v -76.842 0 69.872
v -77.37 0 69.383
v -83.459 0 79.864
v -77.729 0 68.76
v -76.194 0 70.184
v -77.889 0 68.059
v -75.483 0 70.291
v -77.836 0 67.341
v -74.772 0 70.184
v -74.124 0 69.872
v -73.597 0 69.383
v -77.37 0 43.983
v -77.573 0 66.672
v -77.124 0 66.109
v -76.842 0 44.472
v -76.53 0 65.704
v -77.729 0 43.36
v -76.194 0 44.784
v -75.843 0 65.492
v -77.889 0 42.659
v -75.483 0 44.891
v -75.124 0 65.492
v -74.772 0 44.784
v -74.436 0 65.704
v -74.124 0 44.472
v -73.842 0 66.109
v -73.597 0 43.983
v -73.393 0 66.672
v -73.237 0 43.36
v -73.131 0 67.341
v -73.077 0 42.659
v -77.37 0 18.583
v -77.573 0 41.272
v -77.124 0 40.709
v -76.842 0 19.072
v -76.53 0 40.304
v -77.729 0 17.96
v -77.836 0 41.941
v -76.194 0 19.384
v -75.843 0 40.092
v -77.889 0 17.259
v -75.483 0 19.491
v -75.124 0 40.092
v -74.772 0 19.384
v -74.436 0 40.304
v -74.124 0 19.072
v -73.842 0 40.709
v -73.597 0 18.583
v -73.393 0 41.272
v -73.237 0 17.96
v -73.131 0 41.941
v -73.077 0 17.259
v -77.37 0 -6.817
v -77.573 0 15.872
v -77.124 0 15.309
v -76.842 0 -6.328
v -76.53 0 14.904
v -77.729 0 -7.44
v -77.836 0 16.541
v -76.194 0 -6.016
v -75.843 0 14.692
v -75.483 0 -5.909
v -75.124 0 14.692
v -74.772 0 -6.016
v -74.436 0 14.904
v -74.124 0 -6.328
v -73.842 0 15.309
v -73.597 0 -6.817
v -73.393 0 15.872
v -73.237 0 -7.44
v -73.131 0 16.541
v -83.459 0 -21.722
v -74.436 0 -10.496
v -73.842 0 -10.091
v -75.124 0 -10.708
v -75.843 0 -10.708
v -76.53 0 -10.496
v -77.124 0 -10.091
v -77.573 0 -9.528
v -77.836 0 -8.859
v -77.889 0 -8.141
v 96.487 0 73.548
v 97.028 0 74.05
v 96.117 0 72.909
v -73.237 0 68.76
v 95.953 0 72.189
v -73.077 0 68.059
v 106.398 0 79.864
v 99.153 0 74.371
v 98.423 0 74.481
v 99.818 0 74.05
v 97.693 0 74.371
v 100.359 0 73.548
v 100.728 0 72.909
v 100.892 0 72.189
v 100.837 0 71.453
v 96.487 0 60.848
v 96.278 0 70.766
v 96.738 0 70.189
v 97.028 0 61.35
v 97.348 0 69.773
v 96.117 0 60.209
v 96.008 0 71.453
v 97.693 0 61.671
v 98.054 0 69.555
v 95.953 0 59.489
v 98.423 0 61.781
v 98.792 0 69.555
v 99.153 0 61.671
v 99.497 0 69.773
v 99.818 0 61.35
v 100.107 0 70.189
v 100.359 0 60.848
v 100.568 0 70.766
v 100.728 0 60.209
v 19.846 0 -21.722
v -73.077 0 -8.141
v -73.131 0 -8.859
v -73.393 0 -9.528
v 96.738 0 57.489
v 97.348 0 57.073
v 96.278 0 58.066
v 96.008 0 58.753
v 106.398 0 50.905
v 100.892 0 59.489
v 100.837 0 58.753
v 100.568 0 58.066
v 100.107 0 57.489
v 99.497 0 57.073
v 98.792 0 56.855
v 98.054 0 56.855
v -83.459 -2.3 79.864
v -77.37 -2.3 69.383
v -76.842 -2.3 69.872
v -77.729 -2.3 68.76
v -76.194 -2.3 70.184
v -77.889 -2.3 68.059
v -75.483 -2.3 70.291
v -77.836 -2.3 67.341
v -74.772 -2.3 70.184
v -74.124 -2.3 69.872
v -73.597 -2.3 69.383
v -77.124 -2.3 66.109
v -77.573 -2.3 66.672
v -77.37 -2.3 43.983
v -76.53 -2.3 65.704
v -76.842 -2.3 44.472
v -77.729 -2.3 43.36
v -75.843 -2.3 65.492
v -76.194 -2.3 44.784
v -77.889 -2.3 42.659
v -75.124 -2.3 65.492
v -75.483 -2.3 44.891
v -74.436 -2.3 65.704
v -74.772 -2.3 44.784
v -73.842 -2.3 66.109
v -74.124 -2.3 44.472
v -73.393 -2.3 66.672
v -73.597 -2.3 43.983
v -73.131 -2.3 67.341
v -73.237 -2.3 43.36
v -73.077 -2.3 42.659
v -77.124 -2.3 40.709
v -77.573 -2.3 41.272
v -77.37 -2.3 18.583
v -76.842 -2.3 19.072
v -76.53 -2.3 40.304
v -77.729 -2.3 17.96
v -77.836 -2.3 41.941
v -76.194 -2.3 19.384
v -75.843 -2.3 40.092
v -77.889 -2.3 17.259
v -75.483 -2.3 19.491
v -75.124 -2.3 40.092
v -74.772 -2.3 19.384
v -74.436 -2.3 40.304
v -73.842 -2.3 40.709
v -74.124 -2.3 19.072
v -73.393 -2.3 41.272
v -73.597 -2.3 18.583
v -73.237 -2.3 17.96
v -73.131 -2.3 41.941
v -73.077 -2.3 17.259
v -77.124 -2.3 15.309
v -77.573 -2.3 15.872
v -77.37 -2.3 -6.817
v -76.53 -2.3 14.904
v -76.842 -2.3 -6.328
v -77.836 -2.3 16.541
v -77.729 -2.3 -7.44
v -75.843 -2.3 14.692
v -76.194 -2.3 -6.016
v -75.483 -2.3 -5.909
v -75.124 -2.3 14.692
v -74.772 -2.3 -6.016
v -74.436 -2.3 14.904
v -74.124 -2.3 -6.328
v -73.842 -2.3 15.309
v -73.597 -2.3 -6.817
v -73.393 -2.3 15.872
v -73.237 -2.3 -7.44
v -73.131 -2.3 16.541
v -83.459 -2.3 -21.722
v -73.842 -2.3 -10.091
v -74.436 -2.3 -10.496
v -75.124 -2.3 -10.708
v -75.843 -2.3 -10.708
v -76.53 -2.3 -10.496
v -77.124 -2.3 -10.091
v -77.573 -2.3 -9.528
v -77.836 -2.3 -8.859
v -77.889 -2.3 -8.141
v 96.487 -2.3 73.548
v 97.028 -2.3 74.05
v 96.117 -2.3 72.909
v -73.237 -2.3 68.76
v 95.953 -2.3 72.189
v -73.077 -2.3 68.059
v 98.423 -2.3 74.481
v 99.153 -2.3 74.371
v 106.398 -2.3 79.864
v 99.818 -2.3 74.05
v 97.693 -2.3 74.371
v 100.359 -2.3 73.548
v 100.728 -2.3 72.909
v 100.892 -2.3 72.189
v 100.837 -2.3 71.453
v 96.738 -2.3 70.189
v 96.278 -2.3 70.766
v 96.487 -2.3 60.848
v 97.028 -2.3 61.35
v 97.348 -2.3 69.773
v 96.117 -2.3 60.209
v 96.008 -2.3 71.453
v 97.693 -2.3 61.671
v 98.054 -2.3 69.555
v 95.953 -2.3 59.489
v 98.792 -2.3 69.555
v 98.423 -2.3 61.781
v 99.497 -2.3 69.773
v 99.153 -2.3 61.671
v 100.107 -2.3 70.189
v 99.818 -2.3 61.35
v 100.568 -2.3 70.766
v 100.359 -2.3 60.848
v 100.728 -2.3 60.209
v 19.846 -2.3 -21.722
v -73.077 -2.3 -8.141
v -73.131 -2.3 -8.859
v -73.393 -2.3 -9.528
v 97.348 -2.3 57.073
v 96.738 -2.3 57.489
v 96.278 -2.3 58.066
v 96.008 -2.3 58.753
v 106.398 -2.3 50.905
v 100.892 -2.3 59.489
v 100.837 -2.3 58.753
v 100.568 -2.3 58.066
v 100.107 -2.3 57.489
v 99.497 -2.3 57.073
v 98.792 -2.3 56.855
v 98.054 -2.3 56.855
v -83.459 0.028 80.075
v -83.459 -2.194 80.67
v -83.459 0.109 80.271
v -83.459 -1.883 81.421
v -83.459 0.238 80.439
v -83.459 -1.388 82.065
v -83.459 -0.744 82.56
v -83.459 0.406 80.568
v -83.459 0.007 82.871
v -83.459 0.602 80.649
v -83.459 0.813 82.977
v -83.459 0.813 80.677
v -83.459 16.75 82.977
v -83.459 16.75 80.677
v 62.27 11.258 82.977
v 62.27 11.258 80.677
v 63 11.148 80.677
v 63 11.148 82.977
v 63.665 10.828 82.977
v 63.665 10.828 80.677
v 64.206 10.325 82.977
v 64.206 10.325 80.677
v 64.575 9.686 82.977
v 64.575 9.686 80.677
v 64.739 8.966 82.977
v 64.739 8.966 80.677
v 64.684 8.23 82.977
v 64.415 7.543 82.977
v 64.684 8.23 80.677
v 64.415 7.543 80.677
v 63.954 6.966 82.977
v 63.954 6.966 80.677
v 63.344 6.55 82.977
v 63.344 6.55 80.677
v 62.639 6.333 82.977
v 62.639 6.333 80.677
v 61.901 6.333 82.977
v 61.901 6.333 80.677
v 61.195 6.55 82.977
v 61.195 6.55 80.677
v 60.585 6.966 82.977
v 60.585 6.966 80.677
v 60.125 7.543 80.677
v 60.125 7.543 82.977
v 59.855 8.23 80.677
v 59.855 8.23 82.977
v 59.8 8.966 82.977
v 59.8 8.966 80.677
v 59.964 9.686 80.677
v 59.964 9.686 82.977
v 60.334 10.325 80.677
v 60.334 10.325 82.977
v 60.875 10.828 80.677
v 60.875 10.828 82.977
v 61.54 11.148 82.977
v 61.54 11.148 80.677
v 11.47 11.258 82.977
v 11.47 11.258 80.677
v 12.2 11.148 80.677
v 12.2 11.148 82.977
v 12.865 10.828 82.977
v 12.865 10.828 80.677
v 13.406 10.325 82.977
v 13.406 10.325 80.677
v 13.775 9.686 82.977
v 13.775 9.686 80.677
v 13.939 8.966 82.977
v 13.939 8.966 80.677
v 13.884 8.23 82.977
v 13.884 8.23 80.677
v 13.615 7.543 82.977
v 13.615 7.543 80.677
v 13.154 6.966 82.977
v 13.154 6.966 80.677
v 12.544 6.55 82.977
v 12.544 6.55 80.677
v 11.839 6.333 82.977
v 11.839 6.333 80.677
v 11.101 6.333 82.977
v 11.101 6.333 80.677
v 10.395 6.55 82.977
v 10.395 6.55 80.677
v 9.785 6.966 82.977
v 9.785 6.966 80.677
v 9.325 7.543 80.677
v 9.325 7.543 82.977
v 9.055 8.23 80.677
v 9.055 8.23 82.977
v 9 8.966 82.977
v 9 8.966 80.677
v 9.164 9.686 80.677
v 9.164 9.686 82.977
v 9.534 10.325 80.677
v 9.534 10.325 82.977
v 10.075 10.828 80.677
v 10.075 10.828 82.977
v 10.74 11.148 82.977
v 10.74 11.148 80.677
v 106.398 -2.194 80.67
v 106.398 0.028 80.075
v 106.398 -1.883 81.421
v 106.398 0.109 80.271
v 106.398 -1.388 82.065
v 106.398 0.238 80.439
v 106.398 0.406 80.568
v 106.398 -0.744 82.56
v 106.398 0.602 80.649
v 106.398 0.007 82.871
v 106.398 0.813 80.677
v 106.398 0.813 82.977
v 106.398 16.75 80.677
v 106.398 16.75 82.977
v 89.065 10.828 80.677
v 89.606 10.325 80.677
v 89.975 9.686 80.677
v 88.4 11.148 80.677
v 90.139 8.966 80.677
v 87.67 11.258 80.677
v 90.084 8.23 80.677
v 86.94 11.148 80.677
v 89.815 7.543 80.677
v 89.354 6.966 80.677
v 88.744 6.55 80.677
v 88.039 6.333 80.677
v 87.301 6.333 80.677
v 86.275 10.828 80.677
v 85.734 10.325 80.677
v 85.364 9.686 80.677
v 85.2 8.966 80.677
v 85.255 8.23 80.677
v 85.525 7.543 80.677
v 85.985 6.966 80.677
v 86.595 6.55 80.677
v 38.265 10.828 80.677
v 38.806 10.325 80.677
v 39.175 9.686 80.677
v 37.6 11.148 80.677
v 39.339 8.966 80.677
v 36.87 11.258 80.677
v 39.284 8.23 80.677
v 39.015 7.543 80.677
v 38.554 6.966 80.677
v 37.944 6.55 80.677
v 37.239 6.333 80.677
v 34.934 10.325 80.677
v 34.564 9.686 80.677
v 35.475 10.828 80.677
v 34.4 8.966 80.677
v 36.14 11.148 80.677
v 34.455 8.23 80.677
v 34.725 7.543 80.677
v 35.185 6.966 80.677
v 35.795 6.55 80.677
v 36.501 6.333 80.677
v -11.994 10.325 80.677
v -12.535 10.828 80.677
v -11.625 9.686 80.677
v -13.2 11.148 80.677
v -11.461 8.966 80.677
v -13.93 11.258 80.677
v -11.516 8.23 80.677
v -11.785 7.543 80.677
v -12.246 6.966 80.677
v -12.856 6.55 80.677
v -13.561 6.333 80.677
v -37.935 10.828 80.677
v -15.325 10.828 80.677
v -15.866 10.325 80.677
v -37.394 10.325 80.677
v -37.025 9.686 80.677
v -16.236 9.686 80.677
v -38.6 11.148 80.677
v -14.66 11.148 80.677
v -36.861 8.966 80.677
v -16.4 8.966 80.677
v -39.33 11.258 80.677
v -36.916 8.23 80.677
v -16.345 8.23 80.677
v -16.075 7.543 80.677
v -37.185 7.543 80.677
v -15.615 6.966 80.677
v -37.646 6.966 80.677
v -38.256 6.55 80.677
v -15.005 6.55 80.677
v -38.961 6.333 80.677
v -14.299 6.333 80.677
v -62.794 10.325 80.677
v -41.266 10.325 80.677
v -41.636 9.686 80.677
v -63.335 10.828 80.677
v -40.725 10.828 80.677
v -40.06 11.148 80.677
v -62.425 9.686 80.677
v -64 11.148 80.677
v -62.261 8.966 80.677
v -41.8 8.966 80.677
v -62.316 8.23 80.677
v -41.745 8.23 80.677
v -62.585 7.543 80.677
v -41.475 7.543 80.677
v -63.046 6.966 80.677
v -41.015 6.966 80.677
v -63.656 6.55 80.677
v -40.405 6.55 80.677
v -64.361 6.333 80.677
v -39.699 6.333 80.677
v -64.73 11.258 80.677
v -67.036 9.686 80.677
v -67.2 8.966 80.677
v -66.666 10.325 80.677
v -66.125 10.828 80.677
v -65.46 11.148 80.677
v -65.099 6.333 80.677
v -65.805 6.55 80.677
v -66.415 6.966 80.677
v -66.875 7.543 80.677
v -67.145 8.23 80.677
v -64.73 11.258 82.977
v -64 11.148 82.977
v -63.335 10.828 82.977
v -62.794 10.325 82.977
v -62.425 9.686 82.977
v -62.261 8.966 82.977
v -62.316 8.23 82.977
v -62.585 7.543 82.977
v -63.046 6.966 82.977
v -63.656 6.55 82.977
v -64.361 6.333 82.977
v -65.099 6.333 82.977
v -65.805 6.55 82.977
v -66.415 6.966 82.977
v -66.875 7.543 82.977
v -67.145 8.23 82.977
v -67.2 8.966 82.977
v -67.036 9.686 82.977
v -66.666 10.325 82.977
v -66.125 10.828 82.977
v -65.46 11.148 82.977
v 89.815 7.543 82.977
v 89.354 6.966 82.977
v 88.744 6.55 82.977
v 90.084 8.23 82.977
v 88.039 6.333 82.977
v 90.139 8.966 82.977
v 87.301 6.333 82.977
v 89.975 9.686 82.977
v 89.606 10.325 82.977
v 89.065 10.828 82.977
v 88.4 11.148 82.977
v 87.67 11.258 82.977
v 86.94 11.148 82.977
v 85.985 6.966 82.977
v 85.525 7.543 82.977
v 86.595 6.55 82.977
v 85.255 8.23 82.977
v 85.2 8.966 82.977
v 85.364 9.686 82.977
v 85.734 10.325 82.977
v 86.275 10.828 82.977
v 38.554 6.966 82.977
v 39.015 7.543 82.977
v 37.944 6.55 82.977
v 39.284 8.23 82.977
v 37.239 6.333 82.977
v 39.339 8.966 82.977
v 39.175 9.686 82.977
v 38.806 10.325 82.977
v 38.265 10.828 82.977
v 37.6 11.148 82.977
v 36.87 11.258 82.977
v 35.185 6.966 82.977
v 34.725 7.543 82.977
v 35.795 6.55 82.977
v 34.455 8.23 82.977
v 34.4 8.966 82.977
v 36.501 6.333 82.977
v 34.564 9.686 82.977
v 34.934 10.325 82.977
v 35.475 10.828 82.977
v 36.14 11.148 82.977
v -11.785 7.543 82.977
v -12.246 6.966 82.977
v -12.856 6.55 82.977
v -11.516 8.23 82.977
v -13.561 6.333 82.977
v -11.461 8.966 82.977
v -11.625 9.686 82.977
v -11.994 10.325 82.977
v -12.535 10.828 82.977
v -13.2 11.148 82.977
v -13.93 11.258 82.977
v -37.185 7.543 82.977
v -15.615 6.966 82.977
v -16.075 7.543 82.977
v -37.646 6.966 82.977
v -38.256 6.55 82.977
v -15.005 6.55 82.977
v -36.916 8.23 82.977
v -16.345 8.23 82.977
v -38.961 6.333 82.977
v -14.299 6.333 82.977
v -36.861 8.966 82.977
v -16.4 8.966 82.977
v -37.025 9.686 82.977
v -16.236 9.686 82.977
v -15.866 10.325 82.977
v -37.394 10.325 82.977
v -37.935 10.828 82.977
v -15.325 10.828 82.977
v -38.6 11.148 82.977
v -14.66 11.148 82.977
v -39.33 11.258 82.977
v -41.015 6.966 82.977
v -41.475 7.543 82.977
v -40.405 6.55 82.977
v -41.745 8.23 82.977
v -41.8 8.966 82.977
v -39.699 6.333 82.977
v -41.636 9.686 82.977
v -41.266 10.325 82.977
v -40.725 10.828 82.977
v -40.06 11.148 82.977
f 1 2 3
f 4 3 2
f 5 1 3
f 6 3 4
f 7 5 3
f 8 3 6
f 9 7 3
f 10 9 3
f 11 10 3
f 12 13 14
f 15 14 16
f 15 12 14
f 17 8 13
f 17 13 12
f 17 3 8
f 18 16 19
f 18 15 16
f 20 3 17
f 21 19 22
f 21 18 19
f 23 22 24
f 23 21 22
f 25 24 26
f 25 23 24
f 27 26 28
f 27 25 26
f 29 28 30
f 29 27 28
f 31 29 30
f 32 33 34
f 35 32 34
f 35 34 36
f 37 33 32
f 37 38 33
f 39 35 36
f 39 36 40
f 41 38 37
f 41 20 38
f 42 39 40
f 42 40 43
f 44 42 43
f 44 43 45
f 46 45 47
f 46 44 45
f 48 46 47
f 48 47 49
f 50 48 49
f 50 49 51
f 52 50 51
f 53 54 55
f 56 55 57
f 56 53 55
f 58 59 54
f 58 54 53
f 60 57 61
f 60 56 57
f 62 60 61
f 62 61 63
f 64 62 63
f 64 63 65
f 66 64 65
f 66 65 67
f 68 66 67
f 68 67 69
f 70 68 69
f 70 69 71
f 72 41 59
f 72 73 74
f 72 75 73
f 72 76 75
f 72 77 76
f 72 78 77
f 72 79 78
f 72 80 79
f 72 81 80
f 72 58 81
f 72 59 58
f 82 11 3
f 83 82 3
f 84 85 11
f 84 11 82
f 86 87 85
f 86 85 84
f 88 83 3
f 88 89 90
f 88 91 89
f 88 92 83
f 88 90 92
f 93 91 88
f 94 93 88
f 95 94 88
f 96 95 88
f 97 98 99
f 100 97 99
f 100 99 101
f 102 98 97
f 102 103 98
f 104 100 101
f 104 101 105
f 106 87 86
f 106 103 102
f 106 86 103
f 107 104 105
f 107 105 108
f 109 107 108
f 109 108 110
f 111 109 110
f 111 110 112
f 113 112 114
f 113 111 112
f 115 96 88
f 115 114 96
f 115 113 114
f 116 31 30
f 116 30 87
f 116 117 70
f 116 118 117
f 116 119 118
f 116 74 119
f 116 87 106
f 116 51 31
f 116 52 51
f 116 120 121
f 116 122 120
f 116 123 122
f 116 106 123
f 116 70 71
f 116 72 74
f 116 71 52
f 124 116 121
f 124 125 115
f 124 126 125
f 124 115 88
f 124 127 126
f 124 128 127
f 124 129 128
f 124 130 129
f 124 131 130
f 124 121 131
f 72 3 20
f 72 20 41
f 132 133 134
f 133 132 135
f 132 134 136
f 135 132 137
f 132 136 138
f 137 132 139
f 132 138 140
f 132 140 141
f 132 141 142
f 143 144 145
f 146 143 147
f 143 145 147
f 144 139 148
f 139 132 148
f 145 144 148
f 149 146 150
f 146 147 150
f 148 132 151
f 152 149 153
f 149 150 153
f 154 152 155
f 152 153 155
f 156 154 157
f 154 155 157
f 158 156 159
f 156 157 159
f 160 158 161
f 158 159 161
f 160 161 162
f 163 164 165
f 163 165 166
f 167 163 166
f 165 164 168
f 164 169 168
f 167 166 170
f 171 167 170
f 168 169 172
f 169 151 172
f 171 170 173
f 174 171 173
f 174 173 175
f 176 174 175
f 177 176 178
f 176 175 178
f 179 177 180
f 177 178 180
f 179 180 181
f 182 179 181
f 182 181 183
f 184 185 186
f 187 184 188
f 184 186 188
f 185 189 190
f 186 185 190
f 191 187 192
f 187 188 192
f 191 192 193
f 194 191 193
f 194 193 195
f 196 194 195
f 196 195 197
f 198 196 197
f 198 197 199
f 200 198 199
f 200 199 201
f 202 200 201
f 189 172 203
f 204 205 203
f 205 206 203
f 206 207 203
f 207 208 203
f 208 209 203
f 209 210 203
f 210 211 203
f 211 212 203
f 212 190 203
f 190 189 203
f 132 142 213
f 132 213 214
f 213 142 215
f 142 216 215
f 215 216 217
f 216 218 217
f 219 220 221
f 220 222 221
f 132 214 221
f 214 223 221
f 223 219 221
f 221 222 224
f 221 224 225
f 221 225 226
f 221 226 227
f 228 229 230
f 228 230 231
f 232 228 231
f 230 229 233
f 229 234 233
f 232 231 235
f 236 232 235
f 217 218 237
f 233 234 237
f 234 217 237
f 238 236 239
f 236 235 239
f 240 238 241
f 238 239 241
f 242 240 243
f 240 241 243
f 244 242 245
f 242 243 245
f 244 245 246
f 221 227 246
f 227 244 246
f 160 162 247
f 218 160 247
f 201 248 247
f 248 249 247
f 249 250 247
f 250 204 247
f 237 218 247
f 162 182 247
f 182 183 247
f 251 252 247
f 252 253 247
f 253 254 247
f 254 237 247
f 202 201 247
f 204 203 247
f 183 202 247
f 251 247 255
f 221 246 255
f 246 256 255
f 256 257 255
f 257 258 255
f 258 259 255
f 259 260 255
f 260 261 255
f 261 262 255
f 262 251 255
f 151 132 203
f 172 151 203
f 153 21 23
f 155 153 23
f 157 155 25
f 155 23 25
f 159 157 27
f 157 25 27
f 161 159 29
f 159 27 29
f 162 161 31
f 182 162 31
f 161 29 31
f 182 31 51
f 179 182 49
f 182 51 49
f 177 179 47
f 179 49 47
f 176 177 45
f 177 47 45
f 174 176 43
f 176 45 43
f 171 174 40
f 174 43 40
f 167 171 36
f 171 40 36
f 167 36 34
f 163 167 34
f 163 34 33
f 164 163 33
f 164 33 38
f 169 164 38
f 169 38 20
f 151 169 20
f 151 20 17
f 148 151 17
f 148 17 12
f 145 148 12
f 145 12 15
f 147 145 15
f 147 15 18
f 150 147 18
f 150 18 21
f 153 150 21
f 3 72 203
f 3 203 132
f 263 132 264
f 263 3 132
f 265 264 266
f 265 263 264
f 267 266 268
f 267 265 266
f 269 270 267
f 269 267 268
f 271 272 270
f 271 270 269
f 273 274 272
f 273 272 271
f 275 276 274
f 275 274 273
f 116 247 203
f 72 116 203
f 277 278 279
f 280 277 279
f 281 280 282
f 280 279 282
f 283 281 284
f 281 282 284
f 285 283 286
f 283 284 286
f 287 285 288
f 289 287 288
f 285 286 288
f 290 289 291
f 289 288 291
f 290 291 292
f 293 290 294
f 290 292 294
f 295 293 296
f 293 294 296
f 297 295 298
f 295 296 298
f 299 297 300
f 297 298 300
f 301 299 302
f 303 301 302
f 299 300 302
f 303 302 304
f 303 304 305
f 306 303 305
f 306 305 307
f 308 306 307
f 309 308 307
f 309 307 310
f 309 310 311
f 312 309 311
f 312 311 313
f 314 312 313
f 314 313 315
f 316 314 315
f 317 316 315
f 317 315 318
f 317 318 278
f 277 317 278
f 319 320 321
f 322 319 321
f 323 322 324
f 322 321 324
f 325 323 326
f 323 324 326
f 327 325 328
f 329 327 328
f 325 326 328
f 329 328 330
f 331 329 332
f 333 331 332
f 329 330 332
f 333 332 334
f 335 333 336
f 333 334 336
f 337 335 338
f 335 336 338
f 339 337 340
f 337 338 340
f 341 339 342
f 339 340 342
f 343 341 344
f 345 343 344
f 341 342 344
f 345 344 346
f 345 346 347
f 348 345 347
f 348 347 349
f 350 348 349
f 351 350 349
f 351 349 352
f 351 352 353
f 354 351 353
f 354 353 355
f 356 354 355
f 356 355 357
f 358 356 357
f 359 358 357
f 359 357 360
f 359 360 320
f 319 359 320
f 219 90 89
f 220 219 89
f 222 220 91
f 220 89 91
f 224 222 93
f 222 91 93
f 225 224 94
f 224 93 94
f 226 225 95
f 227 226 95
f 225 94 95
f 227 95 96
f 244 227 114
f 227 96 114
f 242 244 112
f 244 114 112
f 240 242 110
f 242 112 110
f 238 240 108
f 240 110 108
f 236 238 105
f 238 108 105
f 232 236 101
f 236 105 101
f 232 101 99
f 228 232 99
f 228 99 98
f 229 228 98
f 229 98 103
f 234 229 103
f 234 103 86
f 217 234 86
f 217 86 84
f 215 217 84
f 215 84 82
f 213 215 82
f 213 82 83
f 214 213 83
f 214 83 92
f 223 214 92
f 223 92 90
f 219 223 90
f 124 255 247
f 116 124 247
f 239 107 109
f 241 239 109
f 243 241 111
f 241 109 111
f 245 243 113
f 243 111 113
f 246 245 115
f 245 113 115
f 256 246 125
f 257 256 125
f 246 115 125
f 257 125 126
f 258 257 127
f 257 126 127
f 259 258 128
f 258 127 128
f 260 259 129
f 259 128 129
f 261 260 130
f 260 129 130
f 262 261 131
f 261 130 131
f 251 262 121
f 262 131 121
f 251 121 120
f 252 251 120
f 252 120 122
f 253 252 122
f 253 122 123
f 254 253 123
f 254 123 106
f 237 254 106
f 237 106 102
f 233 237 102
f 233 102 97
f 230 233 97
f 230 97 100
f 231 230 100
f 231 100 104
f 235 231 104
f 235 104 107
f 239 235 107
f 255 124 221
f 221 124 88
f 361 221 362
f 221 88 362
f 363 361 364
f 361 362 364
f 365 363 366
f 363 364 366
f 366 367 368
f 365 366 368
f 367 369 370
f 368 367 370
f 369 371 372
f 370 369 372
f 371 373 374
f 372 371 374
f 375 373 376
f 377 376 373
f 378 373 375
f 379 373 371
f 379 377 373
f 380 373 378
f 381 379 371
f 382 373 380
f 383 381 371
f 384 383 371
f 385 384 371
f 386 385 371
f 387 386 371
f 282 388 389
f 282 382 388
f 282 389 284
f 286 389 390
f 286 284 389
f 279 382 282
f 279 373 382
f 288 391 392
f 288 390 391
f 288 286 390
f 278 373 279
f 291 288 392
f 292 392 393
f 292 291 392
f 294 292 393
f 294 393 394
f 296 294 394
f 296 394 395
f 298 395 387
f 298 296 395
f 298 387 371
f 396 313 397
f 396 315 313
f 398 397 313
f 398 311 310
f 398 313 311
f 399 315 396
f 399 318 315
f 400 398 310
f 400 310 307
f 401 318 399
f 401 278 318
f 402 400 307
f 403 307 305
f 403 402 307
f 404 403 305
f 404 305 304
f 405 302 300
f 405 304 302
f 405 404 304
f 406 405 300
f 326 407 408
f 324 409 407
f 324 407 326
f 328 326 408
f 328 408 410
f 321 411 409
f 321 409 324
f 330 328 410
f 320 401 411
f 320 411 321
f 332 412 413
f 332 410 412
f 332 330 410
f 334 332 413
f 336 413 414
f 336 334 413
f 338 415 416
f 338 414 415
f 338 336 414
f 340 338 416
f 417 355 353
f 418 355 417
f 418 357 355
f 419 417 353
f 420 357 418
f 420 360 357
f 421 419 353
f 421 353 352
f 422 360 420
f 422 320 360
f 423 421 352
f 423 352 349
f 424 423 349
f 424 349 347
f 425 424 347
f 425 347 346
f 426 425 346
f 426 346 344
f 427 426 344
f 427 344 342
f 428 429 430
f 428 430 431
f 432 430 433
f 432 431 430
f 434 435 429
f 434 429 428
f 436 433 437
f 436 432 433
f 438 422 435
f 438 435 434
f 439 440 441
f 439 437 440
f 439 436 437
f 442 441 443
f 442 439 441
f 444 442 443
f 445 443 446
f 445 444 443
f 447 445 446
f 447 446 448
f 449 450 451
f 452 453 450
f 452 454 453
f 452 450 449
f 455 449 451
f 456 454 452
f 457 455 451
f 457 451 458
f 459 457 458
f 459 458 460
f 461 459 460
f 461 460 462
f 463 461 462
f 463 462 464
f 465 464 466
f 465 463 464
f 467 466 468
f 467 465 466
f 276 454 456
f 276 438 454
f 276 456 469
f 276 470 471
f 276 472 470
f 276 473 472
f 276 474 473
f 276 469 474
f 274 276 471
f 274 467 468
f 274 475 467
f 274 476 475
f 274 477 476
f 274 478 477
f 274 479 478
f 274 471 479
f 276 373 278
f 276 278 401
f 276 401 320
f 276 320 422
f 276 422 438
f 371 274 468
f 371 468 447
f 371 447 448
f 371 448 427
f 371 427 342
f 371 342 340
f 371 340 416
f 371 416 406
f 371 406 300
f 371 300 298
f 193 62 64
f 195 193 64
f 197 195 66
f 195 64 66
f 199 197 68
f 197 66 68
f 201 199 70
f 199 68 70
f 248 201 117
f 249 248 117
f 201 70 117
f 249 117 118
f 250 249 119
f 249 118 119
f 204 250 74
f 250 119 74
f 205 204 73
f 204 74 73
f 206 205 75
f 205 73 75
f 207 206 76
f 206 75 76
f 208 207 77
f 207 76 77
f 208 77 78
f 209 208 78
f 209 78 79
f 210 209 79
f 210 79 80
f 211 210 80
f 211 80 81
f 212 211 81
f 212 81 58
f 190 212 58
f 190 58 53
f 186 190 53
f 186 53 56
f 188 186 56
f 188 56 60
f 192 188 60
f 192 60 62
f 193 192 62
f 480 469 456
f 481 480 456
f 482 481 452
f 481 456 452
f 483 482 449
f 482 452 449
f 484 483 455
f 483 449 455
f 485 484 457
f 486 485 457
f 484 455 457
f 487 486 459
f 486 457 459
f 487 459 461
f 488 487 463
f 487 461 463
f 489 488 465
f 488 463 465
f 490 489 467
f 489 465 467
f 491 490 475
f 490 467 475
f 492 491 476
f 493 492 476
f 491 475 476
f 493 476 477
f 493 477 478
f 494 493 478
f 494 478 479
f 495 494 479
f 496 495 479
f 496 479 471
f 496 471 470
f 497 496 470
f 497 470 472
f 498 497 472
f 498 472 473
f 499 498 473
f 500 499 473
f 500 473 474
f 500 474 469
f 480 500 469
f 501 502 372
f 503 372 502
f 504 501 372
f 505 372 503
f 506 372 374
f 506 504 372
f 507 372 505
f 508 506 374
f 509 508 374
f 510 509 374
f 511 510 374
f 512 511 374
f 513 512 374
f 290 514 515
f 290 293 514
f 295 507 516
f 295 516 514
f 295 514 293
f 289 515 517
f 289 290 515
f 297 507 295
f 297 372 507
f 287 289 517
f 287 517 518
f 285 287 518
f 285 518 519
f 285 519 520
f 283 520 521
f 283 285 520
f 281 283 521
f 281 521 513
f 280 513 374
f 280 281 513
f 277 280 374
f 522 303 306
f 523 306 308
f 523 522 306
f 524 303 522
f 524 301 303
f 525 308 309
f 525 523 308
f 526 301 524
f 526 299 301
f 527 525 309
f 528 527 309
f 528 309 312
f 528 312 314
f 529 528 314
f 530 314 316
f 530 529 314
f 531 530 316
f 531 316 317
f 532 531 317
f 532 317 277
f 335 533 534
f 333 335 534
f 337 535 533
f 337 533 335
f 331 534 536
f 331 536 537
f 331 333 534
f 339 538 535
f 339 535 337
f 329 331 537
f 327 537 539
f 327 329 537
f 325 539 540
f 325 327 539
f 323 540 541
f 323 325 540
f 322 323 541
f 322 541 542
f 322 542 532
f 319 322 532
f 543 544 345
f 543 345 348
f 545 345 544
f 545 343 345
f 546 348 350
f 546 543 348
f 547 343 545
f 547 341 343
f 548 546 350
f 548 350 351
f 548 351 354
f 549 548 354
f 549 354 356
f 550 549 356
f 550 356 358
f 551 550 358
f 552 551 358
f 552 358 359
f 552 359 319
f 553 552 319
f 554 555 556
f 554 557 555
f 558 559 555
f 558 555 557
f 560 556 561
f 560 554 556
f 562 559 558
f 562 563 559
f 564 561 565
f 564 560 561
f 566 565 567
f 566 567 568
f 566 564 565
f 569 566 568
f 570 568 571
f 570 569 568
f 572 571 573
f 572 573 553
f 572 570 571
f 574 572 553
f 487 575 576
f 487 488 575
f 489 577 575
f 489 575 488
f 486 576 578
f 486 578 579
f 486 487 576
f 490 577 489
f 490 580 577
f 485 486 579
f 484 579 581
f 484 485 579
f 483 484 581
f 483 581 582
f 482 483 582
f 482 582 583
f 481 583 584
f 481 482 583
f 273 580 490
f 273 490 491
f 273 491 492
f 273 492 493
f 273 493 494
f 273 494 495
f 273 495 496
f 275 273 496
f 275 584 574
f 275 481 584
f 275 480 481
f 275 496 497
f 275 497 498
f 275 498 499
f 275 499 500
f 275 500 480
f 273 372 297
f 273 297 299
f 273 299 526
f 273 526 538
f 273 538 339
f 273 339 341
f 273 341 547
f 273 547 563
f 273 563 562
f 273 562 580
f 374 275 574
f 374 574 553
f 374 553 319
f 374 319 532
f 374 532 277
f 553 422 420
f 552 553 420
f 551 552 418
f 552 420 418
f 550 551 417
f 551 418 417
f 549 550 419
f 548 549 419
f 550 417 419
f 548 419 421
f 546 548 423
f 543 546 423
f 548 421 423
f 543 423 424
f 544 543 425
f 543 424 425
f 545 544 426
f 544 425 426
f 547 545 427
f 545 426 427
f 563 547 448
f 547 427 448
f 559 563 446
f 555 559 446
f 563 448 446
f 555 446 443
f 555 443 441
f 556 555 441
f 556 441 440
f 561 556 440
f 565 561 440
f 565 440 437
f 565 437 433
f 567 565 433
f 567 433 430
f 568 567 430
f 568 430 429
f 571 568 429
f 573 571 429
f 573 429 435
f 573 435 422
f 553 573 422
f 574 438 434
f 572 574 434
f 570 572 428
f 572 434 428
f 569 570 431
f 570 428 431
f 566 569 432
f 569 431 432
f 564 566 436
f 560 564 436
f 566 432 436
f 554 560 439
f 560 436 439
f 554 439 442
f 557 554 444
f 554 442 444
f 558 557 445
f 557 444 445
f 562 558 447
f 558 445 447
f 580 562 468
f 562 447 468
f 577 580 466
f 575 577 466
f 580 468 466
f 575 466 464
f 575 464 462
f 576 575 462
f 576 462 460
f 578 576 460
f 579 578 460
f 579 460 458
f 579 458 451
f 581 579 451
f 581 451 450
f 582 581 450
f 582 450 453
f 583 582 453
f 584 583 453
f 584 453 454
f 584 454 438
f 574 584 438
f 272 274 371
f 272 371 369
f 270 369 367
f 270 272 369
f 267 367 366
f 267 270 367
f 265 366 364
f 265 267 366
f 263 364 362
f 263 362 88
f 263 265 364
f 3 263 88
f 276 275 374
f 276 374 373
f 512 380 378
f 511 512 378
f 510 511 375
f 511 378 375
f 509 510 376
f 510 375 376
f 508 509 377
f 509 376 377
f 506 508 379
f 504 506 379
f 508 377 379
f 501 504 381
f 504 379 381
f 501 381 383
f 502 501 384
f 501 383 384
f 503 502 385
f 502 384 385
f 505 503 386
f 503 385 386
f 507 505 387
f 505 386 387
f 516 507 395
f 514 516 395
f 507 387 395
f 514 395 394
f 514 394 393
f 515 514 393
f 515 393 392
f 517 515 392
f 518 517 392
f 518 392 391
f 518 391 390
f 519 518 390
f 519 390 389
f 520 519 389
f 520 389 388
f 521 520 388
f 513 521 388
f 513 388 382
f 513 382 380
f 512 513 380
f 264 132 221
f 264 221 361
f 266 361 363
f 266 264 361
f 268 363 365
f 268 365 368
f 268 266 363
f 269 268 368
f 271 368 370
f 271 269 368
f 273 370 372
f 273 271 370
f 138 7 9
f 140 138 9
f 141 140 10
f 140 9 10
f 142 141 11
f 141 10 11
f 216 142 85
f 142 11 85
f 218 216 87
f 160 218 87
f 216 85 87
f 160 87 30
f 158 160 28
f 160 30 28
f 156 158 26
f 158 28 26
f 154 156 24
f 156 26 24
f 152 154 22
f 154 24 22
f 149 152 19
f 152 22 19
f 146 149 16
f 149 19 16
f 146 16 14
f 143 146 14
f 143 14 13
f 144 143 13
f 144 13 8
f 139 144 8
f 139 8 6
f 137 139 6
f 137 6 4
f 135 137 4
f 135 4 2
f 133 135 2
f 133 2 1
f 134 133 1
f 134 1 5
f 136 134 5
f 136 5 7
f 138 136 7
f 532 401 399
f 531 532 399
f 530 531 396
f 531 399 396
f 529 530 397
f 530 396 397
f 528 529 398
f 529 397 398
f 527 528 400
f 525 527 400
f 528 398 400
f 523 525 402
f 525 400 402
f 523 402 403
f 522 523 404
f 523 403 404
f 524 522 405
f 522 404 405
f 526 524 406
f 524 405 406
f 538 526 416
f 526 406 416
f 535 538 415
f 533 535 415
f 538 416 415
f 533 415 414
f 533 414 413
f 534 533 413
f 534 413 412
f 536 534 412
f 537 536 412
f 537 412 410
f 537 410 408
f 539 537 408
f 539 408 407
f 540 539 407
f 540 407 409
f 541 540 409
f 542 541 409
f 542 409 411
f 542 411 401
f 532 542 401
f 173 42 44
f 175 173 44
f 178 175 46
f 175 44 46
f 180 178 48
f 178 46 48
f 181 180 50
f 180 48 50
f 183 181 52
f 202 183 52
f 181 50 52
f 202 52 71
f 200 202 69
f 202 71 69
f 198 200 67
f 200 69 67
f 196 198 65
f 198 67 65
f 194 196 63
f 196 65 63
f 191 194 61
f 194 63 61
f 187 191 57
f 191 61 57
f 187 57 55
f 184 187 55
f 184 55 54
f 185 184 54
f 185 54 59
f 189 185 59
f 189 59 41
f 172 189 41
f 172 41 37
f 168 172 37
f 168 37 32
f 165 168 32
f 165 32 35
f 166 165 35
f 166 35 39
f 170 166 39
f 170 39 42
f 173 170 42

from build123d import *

# Parameters (mm, degrees)
SKETCH1_W                    = 189.8572
SKETCH1_H                    = 175.514
BASE_FLANGE1_DEPTH           = 2.3
EDGE_FLANGE4_STRIP_W         = 10.8256
EDGE_FLANGE4_STRIP_H         = 2.3
EDGE_FLANGE4_STRIP_CUT_DEPTH = 189.8572
EDGE_FLANGE4_DEPTH           = 189.8572
CUT_EXTRUDE1_DEPTH           = 144.797004807
CUT_EXTRUDE5_REACH           = 150.616
SKETCH41_R                   = 2.4765
CUT_EXTRUDE6_REACH           = 137.965
SKETCH42_R                   = 2.413
SKETCH42_R_2                 = 2.4765


# Sheet-metal steps are written as plain solids
with BuildPart() as part:
    # Sketch1 → Base-Flange1 (new body)
    with BuildSketch(Plane(origin=(0, 0, 0), x_dir=(1, 0, 0), z_dir=(0, 1, 0))):
        with Locations((11.4698, 7.08)):
            Rectangle(SKETCH1_W, SKETCH1_H)
    extrude(amount=-BASE_FLANGE1_DEPTH)

    # Edge-Flange4 strip (across the edge) → Edge-Flange4 strip cut (cut)
    with BuildSketch(Plane(origin=(-83.4588, 0, 80.677), x_dir=(0, 0, -1), z_dir=(1, 0, 0))):
        with Locations((-4.6, -1.15)):
            Rectangle(EDGE_FLANGE4_STRIP_W, EDGE_FLANGE4_STRIP_H)
    extrude(amount=EDGE_FLANGE4_STRIP_CUT_DEPTH, mode=Mode.SUBTRACT)

    # Edge-Flange4 section (across the edge) → Edge-Flange4 (add)
    with BuildSketch(Plane(origin=(-83.4588, 0, 80.677), x_dir=(0, 0, -1), z_dir=(1, 0, 0))):
        with BuildLine():
            Line((-2.3, 0.8128), (-2.3, 16.75))
            Line((-2.3, 16.75), (0, 16.75))
            Line((0, 16.75), (0, 0.8128))
            ThreePointArc((0, 0.8128), (0.238063608, 0.238063608), (0.8128, 0))
            Line((0.8128, 0), (0.8128, -2.3))
            ThreePointArc((0.8128, -2.3), (-1.388281988, -1.388281988), (-2.3, 0.8128))
        make_face()
    extrude(amount=EDGE_FLANGE4_DEPTH)

    # Sketch36 → Cut-Extrude1 (cut, through all)
    with BuildSketch(Plane.XZ.offset(2.3)):
        Polygon((19.845566889, -21.7218), (-83.4588, -21.7218), (-83.4588, -94.837), (106.3984, -94.837), (106.3984, 50.90465034), align=None)
    extrude(amount=-CUT_EXTRUDE1_DEPTH, mode=Mode.SUBTRACT)

    # Sketch41 → Cut-Extrude5 (cut, up to next)
    with BuildSketch(Plane(origin=(0, 0, 80.677), x_dir=(-1, 0, 0), z_dir=(0, 0, -1)), mode=Mode.PRIVATE) as cut_extrude5_sk1:
        with Locations(Location((64.7302, 8.7814, 0), (0, 0, 90))):
            Circle(SKETCH41_R)
    cut_extrude5_tool1 = extrude(cut_extrude5_sk1.sketch, amount=-CUT_EXTRUDE5_REACH, mode=Mode.PRIVATE) & part.part
    # Sketch41 → Cut-Extrude5 (cut, up to next)
    with BuildSketch(Plane(origin=(0, 0, 80.677), x_dir=(-1, 0, 0), z_dir=(0, 0, -1)), mode=Mode.PRIVATE) as cut_extrude5_sk2:
        with Locations(Location((39.3302, 8.7814, 0), (0, 0, 90))):
            Circle(SKETCH41_R)
    cut_extrude5_tool2 = extrude(cut_extrude5_sk2.sketch, amount=-CUT_EXTRUDE5_REACH, mode=Mode.PRIVATE) & part.part
    # Sketch41 → Cut-Extrude5 (cut, up to next)
    with BuildSketch(Plane(origin=(0, 0, 80.677), x_dir=(-1, 0, 0), z_dir=(0, 0, -1)), mode=Mode.PRIVATE) as cut_extrude5_sk3:
        with Locations(Location((13.9302, 8.7814, 0), (0, 0, 90))):
            Circle(SKETCH41_R)
    cut_extrude5_tool3 = extrude(cut_extrude5_sk3.sketch, amount=-CUT_EXTRUDE5_REACH, mode=Mode.PRIVATE) & part.part
    # Sketch41 → Cut-Extrude5 (cut, up to next)
    with BuildSketch(Plane(origin=(0, 0, 80.677), x_dir=(-1, 0, 0), z_dir=(0, 0, -1)), mode=Mode.PRIVATE) as cut_extrude5_sk4:
        with Locations(Location((-11.4698, 8.7814, 0), (0, 0, 90))):
            Circle(SKETCH41_R)
    cut_extrude5_tool4 = extrude(cut_extrude5_sk4.sketch, amount=-CUT_EXTRUDE5_REACH, mode=Mode.PRIVATE) & part.part
    # Sketch41 → Cut-Extrude5 (cut, up to next)
    with BuildSketch(Plane(origin=(0, 0, 80.677), x_dir=(-1, 0, 0), z_dir=(0, 0, -1)), mode=Mode.PRIVATE) as cut_extrude5_sk5:
        with Locations(Location((-36.8698, 8.7814, 0), (0, 0, 90))):
            Circle(SKETCH41_R)
    cut_extrude5_tool5 = extrude(cut_extrude5_sk5.sketch, amount=-CUT_EXTRUDE5_REACH, mode=Mode.PRIVATE) & part.part
    # Sketch41 → Cut-Extrude5 (cut, up to next)
    with BuildSketch(Plane(origin=(0, 0, 80.677), x_dir=(-1, 0, 0), z_dir=(0, 0, -1)), mode=Mode.PRIVATE) as cut_extrude5_sk6:
        with Locations(Location((-62.2698, 8.7814, 0), (0, 0, 90))):
            Circle(SKETCH41_R)
    cut_extrude5_tool6 = extrude(cut_extrude5_sk6.sketch, amount=-CUT_EXTRUDE5_REACH, mode=Mode.PRIVATE) & part.part
    # Sketch41 → Cut-Extrude5 (cut, up to next)
    with BuildSketch(Plane(origin=(0, 0, 80.677), x_dir=(-1, 0, 0), z_dir=(0, 0, -1)), mode=Mode.PRIVATE) as cut_extrude5_sk7:
        with Locations(Location((-87.6698, 8.7814, 0), (0, 0, 90))):
            Circle(SKETCH41_R)
    cut_extrude5_tool7 = extrude(cut_extrude5_sk7.sketch, amount=-CUT_EXTRUDE5_REACH, mode=Mode.PRIVATE) & part.part
    add(cut_extrude5_tool1.solids().sort_by_distance((-64.7302, 8.7814, 80.677))[0], mode=Mode.SUBTRACT)
    add(cut_extrude5_tool2.solids().sort_by_distance((-39.3302, 8.7814, 80.677))[0], mode=Mode.SUBTRACT)
    add(cut_extrude5_tool3.solids().sort_by_distance((-13.9302, 8.7814, 80.677))[0], mode=Mode.SUBTRACT)
    add(cut_extrude5_tool4.solids().sort_by_distance((11.4698, 8.7814, 80.677))[0], mode=Mode.SUBTRACT)
    add(cut_extrude5_tool5.solids().sort_by_distance((36.8698, 8.7814, 80.677))[0], mode=Mode.SUBTRACT)
    add(cut_extrude5_tool6.solids().sort_by_distance((62.2698, 8.7814, 80.677))[0], mode=Mode.SUBTRACT)
    add(cut_extrude5_tool7.solids().sort_by_distance((87.6698, 8.7814, 80.677))[0], mode=Mode.SUBTRACT)

    # Sketch42 → Cut-Extrude6 (cut, up to next)
    with BuildSketch(Plane(origin=(0, 0, 0), x_dir=(1, 0, 0), z_dir=(0, 1, 0)), mode=Mode.PRIVATE) as cut_extrude6_sk1:
        with Locations(Location((-75.4832, 8.3218, 0), (0, 0, 270))):
            Circle(SKETCH42_R)
    cut_extrude6_tool1 = extrude(cut_extrude6_sk1.sketch, amount=-CUT_EXTRUDE6_REACH, mode=Mode.PRIVATE) & part.part
    # Sketch42 → Cut-Extrude6 (cut, up to next)
    with BuildSketch(Plane(origin=(0, 0, 0), x_dir=(1, 0, 0), z_dir=(0, 1, 0)), mode=Mode.PRIVATE) as cut_extrude6_sk2:
        with Locations(Location((-75.4832, -17.0782, 0), (0, 0, 270))):
            Circle(SKETCH42_R)
    cut_extrude6_tool2 = extrude(cut_extrude6_sk2.sketch, amount=-CUT_EXTRUDE6_REACH, mode=Mode.PRIVATE) & part.part
    # Sketch42 → Cut-Extrude6 (cut, up to next)
    with BuildSketch(Plane(origin=(0, 0, 0), x_dir=(1, 0, 0), z_dir=(0, 1, 0)), mode=Mode.PRIVATE) as cut_extrude6_sk3:
        with Locations(Location((-75.4832, -42.4782, 0), (0, 0, 270))):
            Circle(SKETCH42_R)
    cut_extrude6_tool3 = extrude(cut_extrude6_sk3.sketch, amount=-CUT_EXTRUDE6_REACH, mode=Mode.PRIVATE) & part.part
    # Sketch42 → Cut-Extrude6 (cut, up to next)
    with BuildSketch(Plane(origin=(0, 0, 0), x_dir=(1, 0, 0), z_dir=(0, 1, 0)), mode=Mode.PRIVATE) as cut_extrude6_sk4:
        with Locations(Location((-75.4832, -67.8782, 0), (0, 0, 270))):
            Circle(SKETCH42_R)
    cut_extrude6_tool4 = extrude(cut_extrude6_sk4.sketch, amount=-CUT_EXTRUDE6_REACH, mode=Mode.PRIVATE) & part.part
    # Sketch42 → Cut-Extrude6 (cut, up to next)
    with BuildSketch(Plane(origin=(0, 0, 0), x_dir=(1, 0, 0), z_dir=(0, 1, 0)), mode=Mode.PRIVATE) as cut_extrude6_sk5:
        with Locations(Location((98.4228, -59.3042, 0), (0, 0, 270))):
            Circle(SKETCH42_R_2)
    cut_extrude6_tool5 = extrude(cut_extrude6_sk5.sketch, amount=-CUT_EXTRUDE6_REACH, mode=Mode.PRIVATE) & part.part
    # Sketch42 → Cut-Extrude6 (cut, up to next)
    with BuildSketch(Plane(origin=(0, 0, 0), x_dir=(1, 0, 0), z_dir=(0, 1, 0)), mode=Mode.PRIVATE) as cut_extrude6_sk6:
        with Locations(Location((98.4228, -72.0042, 0), (0, 0, 270))):
            Circle(SKETCH42_R_2)
    cut_extrude6_tool6 = extrude(cut_extrude6_sk6.sketch, amount=-CUT_EXTRUDE6_REACH, mode=Mode.PRIVATE) & part.part
    add(cut_extrude6_tool1.solids().sort_by_distance((-75.4832, 0, -8.3218))[0], mode=Mode.SUBTRACT)
    add(cut_extrude6_tool2.solids().sort_by_distance((-75.4832, 0, 17.0782))[0], mode=Mode.SUBTRACT)
    add(cut_extrude6_tool3.solids().sort_by_distance((-75.4832, 0, 42.4782))[0], mode=Mode.SUBTRACT)
    add(cut_extrude6_tool4.solids().sort_by_distance((-75.4832, 0, 67.8782))[0], mode=Mode.SUBTRACT)
    add(cut_extrude6_tool5.solids().sort_by_distance((98.4228, 0, 59.3042))[0], mode=Mode.SUBTRACT)
    add(cut_extrude6_tool6.solids().sort_by_distance((98.4228, 0, 72.0042))[0], mode=Mode.SUBTRACT)


solid = part.part
